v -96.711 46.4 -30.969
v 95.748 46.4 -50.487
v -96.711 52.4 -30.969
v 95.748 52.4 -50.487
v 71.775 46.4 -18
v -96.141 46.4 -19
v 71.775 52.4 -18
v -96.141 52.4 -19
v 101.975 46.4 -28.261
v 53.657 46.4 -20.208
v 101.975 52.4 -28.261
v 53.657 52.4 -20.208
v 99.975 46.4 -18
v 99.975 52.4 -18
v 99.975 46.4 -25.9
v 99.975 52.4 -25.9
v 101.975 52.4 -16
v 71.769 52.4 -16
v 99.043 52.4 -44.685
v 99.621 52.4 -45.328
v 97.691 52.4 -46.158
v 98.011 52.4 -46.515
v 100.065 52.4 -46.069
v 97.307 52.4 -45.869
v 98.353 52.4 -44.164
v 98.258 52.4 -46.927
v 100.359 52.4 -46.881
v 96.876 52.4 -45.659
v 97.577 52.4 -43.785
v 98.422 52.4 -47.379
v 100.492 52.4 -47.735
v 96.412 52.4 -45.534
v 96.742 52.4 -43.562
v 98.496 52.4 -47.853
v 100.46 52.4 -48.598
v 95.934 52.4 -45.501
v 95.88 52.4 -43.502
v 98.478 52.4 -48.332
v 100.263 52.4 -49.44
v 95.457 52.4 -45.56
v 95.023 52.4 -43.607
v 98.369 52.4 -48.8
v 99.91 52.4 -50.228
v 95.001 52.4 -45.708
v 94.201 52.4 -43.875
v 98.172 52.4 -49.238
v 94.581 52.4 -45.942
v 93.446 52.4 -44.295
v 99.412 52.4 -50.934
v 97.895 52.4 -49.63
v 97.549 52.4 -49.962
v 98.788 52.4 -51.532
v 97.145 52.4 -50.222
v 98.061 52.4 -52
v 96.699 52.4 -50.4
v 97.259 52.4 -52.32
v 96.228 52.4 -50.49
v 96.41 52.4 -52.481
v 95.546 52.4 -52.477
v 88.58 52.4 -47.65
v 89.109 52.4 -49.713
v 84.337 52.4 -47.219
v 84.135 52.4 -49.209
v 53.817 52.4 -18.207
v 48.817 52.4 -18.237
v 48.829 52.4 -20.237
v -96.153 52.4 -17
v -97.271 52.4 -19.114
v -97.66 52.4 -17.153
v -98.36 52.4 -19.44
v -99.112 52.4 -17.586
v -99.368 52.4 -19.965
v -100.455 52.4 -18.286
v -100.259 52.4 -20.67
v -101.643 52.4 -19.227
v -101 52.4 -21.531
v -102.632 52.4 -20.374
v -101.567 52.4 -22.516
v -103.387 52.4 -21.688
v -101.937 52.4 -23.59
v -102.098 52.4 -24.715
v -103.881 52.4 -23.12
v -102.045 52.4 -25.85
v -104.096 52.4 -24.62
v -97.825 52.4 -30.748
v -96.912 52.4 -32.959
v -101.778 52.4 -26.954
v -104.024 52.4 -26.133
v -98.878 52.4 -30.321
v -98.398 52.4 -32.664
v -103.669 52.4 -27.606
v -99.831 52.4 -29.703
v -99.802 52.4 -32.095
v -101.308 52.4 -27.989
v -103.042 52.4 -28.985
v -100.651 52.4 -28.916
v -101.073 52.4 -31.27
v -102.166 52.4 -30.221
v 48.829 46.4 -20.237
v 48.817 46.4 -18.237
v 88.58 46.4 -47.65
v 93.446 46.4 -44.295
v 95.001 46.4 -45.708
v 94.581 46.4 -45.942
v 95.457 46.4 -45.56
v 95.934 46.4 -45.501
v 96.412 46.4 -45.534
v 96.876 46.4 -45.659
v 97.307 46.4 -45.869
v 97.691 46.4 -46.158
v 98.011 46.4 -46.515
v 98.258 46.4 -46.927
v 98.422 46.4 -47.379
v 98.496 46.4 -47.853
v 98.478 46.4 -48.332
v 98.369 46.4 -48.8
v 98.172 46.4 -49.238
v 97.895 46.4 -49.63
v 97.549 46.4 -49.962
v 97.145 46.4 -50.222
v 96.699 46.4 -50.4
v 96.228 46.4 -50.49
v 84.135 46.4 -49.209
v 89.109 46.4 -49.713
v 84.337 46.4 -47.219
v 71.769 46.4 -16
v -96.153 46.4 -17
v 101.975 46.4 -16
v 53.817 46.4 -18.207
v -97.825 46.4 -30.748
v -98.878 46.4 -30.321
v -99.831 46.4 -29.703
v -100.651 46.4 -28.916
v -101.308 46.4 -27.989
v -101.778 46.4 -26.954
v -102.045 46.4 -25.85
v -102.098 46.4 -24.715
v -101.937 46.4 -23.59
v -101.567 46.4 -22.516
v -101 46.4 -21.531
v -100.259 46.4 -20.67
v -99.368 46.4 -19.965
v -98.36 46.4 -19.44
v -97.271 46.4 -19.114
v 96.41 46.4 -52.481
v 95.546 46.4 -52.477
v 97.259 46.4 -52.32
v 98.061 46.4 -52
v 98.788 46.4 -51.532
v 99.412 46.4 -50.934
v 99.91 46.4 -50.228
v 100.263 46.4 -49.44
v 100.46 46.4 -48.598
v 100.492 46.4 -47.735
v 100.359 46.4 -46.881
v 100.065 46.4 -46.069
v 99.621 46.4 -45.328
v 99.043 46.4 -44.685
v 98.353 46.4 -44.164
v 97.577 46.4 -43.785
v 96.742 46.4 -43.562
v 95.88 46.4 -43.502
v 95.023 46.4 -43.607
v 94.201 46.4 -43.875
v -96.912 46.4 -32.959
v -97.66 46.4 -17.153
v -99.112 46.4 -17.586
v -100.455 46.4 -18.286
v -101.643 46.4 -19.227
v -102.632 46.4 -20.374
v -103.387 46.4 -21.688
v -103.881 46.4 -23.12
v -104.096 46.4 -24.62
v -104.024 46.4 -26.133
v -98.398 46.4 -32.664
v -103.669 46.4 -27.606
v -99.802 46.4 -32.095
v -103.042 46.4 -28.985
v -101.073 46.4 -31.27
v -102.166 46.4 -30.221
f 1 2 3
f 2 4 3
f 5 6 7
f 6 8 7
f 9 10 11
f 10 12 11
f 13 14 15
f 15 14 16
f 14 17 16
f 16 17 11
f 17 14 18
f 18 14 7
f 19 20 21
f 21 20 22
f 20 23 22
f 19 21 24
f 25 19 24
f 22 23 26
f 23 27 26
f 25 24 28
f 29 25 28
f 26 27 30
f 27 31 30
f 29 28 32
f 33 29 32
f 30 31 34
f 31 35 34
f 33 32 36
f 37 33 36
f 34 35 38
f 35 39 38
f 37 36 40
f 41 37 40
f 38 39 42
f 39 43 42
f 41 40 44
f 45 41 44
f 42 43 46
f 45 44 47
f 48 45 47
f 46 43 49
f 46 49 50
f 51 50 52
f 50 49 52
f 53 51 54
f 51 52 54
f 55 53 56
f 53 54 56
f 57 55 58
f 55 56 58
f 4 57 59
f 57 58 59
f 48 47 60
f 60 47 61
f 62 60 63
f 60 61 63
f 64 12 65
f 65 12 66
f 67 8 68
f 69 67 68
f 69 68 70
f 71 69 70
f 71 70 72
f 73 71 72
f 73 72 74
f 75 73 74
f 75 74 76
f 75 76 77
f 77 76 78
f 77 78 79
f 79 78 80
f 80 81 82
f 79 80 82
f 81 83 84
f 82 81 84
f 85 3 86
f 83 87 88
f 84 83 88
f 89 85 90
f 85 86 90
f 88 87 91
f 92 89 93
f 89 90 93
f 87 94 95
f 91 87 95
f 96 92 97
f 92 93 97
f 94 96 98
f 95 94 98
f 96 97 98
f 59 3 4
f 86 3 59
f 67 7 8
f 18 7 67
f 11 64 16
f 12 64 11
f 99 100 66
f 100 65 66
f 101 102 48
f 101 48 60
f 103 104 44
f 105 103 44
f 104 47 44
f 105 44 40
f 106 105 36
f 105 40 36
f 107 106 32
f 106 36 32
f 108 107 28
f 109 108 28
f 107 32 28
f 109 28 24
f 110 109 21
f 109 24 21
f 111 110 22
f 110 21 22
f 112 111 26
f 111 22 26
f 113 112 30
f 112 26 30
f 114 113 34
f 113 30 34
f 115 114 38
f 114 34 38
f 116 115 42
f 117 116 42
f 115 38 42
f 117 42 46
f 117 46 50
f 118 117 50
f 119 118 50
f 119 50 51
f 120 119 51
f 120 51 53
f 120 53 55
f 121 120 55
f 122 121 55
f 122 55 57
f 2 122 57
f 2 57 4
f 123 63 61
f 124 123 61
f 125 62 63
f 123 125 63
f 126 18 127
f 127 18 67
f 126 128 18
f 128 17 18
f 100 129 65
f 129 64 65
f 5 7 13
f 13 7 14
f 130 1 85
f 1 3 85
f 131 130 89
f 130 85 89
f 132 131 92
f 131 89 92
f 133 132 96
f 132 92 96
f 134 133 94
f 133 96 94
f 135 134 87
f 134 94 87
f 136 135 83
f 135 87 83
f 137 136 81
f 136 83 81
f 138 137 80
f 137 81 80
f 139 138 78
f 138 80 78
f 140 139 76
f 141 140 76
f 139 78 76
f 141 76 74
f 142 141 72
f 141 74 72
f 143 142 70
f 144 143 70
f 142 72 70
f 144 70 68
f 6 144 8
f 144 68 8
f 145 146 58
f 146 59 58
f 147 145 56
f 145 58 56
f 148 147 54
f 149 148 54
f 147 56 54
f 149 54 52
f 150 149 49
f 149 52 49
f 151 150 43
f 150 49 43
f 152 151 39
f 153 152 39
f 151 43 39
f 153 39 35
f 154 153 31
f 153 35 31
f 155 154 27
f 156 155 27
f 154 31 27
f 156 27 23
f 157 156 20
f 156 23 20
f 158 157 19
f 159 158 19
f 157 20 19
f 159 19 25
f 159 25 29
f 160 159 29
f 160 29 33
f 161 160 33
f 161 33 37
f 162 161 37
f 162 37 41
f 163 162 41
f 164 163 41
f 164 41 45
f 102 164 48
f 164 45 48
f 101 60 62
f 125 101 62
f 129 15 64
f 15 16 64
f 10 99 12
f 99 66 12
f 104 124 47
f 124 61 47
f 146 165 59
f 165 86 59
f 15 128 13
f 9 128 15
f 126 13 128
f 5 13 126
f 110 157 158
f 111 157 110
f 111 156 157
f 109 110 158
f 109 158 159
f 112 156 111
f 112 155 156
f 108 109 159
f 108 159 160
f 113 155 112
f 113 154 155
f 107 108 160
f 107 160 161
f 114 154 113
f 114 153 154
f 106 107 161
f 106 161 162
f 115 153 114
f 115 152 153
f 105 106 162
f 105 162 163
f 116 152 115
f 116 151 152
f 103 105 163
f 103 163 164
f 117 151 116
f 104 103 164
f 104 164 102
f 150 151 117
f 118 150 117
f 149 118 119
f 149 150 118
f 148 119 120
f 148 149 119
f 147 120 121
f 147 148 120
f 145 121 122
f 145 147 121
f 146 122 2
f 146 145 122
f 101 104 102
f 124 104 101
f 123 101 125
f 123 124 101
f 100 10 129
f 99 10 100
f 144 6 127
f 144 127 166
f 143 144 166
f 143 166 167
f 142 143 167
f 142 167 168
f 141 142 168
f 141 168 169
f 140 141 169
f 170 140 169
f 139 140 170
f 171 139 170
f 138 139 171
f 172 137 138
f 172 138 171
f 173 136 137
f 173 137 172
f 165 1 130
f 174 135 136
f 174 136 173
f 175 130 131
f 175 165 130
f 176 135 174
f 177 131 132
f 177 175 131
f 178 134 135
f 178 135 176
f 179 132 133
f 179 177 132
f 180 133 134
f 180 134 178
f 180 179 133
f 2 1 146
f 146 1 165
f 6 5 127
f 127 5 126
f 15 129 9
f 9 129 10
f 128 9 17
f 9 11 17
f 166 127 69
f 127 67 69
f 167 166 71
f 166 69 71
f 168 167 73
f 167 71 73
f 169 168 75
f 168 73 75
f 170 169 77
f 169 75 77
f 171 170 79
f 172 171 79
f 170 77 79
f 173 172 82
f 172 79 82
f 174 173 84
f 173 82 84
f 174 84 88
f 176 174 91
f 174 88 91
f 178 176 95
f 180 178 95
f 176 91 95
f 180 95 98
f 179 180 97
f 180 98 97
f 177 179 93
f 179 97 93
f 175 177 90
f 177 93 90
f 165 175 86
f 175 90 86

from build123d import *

# Parameters (mm, degrees)
EXTRUDE_THIN1_DEPTH = 3


with BuildPart() as part:
    # Sketch1 → Extrude-Thin1 (new, symmetric)
    with BuildSketch(Plane(origin=(0, 49.4, 0), x_dir=(1, 0, 0), z_dir=(0, 1, 0))):
        with BuildLine():
            Line((84.13477336, 49.209016257), (89.109258274, 49.713496032))
            Line((89.109258274, 49.713496032), (94.581141252, 45.941641467))
            ThreePointArc((94.581141252, 45.941641467), (98.421521165, 47.378521725), (95.747760112, 50.487242457))
            Line((95.747760112, 50.487242457), (-96.710506132, 30.969381896))
            ThreePointArc((-96.710506132, 30.969381896), (-102.09834696, 24.714771507), (-96.140865711, 19.000106419))
            Line((-96.140865711, 19.000106419), (71.775188242, 18))
            Line((71.775188242, 18), (99.975188242, 18))
            Line((99.975188242, 18), (99.975188242, 25.9))
            Line((99.975188242, 25.9), (53.816953341, 18.20696085))
            Line((53.816953341, 18.20696085), (48.816953341, 18.236740802))
            Line((48.816953341, 18.236740802), (48.82886511, 20.236705329))
            Line((48.82886511, 20.236705329), (53.65734488, 20.20794695))
            Line((53.65734488, 20.20794695), (101.975188242, 28.260920843))
            Line((101.975188242, 28.260920843), (101.975188242, 16))
            Line((101.975188242, 16), (71.769232304, 16))
            Line((71.769232304, 16), (-96.152777481, 17.000141892))
            ThreePointArc((-96.152777481, 17.000141892), (-104.096085812, 24.619695343), (-96.912298043, 32.959175862))
            Line((-96.912298043, 32.959175862), (95.545968202, 52.477036422))
            ThreePointArc((95.545968202, 52.477036422), (100.358738097, 46.881339105), (93.446054253, 44.29495464))
            Line((93.446054253, 44.29495464), (88.579542516, 47.649517336))
            Line((88.579542516, 47.649517336), (84.33656527, 47.219222292))
            Line((84.33656527, 47.219222292), (84.13477336, 49.209016257))
        make_face()
    extrude(amount=EXTRUDE_THIN1_DEPTH, both=True)


solid = part.part
